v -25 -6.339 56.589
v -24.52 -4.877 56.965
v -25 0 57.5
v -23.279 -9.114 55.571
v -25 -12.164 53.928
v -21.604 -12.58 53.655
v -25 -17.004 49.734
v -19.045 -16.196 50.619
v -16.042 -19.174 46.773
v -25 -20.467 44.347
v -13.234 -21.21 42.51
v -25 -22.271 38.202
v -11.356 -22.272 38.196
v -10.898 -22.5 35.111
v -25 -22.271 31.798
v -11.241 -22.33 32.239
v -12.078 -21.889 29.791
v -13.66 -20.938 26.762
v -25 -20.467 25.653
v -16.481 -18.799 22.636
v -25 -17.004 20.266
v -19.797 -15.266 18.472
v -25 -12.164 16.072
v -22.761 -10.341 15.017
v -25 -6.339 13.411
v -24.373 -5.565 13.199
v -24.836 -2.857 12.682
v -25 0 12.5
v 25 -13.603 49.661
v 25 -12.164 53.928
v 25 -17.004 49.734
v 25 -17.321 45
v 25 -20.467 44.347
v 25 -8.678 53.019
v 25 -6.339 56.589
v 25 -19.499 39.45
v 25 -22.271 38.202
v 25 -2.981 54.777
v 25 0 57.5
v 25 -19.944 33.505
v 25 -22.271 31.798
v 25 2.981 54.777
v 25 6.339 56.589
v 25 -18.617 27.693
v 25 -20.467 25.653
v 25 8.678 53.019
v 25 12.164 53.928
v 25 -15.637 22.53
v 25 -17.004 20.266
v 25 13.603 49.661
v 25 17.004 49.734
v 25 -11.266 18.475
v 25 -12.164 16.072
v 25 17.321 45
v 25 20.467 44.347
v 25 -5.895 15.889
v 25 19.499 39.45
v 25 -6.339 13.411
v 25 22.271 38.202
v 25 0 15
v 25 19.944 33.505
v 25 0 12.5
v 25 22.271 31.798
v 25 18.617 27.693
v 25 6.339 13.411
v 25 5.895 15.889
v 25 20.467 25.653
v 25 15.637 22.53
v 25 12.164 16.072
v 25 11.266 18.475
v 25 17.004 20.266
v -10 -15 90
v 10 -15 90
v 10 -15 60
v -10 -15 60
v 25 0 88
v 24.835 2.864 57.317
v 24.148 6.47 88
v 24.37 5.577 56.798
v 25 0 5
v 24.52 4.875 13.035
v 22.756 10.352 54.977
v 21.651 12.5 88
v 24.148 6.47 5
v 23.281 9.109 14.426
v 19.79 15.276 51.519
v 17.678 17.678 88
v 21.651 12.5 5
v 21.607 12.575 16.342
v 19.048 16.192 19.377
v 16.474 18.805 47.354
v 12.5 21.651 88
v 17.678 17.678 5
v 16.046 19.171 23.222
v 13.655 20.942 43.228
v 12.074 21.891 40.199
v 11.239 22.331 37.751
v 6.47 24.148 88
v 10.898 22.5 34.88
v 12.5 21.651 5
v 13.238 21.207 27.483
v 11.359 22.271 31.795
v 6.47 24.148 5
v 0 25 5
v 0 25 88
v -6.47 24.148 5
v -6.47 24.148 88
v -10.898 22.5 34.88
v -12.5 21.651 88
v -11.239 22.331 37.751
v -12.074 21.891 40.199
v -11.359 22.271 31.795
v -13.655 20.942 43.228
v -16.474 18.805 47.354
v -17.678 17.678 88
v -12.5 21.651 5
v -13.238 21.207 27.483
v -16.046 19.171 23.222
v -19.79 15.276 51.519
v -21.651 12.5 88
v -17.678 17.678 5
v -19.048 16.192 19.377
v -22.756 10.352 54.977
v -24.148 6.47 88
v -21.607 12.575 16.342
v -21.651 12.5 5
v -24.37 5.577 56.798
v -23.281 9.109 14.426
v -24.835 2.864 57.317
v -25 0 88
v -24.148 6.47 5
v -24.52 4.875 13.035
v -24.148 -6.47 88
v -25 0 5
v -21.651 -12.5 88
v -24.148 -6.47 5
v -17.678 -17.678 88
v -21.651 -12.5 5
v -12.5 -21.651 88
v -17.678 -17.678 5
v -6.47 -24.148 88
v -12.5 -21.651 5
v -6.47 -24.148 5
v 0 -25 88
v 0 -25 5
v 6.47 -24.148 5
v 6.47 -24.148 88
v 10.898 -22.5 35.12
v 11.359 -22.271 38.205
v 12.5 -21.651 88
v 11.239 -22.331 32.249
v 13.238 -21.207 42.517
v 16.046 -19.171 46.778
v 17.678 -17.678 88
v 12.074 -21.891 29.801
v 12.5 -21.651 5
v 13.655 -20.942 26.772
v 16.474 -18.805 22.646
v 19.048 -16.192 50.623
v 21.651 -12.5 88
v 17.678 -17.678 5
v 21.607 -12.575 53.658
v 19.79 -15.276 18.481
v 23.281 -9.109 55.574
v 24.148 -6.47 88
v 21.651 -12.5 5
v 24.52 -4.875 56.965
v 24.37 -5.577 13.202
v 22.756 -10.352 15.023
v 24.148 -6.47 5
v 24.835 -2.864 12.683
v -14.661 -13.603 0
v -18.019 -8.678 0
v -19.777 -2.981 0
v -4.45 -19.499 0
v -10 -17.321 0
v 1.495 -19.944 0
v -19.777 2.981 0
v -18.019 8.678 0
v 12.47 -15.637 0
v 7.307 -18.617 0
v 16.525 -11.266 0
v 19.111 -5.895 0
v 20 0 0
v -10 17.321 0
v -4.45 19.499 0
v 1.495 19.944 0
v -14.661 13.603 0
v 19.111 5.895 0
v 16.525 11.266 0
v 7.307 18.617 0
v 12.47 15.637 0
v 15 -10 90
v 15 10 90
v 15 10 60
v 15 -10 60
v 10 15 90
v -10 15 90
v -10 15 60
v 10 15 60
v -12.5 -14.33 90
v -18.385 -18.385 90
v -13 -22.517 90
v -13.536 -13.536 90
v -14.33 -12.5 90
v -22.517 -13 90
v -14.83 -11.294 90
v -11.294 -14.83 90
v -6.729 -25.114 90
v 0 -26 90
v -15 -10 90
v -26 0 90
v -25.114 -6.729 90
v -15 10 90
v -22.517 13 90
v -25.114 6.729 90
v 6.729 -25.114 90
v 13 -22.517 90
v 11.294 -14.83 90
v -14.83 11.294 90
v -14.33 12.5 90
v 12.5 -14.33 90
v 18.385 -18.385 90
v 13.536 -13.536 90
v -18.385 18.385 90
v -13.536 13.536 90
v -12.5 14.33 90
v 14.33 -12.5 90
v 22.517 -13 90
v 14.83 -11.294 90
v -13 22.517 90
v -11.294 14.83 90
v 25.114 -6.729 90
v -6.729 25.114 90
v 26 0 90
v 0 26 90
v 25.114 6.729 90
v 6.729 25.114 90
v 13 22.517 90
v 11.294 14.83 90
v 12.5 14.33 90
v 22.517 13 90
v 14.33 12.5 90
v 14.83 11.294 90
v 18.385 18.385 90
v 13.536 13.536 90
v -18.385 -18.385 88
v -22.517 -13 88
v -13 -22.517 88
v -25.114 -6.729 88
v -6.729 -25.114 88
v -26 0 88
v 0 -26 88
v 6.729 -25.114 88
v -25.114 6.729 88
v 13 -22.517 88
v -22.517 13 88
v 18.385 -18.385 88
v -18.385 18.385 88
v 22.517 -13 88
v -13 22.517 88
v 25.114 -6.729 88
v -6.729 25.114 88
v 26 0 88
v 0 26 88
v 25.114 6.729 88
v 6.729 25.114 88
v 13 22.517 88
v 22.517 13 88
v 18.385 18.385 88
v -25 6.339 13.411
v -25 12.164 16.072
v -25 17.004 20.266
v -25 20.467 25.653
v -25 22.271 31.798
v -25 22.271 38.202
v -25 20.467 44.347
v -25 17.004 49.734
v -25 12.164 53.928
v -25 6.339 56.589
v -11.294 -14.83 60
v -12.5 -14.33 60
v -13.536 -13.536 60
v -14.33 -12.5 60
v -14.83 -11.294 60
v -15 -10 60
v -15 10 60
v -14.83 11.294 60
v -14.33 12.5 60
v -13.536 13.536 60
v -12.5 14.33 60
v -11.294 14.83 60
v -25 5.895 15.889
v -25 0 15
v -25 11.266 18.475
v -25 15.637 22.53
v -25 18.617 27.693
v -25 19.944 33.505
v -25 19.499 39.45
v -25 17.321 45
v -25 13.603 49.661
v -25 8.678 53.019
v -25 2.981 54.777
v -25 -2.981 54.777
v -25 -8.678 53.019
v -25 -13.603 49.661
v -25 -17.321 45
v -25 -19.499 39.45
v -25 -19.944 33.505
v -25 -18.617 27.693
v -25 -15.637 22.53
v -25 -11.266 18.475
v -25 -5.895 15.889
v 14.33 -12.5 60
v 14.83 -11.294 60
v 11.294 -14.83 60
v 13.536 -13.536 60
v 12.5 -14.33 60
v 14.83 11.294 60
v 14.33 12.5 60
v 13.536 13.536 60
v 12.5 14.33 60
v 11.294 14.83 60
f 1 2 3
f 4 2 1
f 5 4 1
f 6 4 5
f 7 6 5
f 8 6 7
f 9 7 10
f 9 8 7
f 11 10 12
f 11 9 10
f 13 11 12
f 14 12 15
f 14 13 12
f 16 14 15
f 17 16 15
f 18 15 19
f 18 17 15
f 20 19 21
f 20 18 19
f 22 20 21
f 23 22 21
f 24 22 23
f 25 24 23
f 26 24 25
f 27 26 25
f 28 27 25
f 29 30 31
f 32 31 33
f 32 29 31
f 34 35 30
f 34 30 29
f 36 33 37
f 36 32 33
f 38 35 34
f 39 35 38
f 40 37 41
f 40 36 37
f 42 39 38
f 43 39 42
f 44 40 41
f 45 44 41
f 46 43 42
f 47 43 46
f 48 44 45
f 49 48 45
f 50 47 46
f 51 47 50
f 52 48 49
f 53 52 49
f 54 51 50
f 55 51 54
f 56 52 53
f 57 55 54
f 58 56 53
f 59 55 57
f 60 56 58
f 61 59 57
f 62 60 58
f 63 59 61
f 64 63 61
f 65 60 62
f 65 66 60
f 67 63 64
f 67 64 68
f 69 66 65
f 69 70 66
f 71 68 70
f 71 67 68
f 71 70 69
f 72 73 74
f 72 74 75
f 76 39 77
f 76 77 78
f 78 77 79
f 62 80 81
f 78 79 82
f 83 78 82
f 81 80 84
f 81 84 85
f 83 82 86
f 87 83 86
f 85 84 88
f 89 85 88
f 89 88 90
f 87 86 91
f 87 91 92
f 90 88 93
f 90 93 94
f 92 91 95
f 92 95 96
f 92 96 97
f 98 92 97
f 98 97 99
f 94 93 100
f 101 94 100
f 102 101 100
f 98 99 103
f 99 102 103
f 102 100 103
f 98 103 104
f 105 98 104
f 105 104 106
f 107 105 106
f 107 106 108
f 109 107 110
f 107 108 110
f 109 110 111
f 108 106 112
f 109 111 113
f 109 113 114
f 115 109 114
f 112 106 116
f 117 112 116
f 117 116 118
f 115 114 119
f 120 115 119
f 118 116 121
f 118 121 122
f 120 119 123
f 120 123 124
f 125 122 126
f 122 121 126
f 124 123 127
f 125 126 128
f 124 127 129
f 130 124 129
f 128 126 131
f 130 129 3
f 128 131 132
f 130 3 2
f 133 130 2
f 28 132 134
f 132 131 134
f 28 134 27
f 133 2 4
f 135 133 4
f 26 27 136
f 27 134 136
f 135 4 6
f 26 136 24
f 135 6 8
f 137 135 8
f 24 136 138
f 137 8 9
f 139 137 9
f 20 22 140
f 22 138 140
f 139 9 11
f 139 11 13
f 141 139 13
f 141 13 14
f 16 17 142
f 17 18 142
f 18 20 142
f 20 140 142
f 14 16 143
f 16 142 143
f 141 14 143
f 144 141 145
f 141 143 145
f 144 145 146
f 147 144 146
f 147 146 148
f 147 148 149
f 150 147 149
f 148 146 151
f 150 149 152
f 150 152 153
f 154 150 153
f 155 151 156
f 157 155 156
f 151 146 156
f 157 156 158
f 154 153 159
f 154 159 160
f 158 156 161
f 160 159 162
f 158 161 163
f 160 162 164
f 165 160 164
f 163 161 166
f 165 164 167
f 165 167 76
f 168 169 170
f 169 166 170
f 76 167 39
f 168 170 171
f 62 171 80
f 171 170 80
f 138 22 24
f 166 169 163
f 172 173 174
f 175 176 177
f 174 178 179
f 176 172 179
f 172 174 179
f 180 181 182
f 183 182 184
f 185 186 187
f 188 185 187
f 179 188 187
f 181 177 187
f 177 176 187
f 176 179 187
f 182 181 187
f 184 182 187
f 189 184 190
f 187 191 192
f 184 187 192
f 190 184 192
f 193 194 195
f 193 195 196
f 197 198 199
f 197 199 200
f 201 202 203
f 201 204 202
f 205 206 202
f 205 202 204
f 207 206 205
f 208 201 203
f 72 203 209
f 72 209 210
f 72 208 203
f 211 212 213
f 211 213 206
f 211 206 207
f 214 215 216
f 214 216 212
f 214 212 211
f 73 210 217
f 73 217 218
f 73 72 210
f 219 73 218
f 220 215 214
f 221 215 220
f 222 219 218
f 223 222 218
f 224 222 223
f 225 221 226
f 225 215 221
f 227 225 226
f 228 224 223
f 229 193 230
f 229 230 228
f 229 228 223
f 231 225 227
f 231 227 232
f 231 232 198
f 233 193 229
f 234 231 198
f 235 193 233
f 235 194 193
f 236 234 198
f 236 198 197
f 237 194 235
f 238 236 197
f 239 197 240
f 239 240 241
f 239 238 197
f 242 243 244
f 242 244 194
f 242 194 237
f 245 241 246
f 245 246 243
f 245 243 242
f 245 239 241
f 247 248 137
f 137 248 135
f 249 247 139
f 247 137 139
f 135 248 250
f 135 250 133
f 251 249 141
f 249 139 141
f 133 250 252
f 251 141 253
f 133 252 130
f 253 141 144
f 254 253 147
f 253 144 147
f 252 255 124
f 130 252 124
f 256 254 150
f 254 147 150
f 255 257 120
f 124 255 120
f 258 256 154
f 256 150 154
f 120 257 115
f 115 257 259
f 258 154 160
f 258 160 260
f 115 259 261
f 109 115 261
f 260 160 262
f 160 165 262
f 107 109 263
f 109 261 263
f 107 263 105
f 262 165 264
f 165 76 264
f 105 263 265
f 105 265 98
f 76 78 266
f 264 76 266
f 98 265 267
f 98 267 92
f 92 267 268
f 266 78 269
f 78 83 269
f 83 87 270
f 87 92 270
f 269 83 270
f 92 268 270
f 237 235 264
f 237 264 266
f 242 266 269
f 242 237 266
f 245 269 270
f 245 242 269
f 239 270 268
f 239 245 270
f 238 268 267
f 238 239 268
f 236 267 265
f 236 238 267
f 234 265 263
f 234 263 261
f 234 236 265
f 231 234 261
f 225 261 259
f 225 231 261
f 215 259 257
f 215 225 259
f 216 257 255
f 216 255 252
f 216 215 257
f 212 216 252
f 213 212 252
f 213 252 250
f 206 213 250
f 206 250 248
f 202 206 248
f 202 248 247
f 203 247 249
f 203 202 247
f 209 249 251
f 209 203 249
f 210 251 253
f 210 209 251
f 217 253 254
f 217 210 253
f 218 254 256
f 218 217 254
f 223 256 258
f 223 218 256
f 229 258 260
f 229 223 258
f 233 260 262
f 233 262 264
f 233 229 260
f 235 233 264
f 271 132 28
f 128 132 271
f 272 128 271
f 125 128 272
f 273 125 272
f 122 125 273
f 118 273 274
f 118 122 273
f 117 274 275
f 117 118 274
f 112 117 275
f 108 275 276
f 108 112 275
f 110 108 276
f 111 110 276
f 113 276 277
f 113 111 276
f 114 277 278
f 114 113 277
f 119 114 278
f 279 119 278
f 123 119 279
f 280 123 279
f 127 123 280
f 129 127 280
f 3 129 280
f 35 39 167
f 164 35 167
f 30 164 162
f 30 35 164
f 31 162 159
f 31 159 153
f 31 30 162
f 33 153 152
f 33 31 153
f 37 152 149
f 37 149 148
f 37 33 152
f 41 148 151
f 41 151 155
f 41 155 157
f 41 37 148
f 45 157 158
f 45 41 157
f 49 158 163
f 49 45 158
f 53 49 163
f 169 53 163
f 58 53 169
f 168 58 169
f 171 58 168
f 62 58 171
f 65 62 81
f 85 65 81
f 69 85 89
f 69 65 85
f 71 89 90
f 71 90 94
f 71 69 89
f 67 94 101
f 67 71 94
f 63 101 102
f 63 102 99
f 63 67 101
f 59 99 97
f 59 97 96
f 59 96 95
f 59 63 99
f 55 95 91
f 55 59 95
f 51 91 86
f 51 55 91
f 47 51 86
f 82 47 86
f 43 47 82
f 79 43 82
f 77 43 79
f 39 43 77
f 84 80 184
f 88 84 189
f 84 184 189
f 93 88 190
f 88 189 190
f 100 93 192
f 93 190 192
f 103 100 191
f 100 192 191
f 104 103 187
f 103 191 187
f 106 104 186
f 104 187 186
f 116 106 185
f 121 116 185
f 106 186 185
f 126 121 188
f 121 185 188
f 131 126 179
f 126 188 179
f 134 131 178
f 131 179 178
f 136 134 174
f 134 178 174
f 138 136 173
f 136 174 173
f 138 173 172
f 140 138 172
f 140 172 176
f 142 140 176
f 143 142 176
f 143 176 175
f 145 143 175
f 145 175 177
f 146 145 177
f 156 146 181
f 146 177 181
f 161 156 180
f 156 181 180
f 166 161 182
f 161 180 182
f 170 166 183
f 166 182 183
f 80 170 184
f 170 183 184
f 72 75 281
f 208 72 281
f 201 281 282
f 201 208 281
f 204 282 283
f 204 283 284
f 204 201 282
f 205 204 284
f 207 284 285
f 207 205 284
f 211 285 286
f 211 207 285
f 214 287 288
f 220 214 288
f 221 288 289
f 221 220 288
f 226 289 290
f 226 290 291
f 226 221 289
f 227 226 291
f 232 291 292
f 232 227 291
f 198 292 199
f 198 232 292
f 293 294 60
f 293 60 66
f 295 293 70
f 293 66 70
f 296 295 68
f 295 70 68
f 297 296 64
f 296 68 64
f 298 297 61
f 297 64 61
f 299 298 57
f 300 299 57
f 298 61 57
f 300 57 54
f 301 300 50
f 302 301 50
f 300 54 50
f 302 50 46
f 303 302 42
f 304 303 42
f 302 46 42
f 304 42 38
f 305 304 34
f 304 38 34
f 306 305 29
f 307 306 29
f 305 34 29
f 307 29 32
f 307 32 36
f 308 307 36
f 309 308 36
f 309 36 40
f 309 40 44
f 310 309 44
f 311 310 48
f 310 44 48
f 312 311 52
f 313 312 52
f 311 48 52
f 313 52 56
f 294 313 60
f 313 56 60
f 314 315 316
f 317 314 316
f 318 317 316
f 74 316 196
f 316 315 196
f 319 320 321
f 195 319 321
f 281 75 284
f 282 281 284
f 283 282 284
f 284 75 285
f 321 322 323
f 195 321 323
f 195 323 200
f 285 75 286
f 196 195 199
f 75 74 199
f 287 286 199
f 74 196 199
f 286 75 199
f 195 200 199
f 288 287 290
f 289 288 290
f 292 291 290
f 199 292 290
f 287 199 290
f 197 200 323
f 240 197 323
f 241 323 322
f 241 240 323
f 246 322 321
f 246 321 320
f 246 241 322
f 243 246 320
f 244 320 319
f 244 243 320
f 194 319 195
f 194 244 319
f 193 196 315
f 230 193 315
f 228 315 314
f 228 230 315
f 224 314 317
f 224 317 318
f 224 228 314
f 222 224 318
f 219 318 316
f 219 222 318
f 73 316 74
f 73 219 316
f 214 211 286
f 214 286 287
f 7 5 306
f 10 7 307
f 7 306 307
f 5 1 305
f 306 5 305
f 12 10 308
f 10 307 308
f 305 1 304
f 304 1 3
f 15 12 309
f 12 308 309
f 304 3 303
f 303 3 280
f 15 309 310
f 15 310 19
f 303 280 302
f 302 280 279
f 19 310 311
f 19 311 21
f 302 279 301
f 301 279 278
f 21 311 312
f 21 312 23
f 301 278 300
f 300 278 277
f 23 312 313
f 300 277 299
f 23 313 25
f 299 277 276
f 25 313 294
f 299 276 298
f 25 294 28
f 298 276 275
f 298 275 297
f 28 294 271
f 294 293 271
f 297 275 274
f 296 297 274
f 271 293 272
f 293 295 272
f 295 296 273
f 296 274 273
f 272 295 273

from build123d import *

# Parameters (mm, degrees)
SKETCH1_R               = 25
BOSS_EXTRUDE3_DEPTH     = 100
SKETCH4_R               = 22.5
BOSS_EXTRUDE4_DEPTH     = 25
SKETCH5_R               = 20
CUT_EXTRUDE2_DEPTH      = 50
CHAMFER1_SIZE           = 5
SKETCH9_W               = 10
SKETCH9_H               = 60.112874217
CUT_EXTRUDE3_DEPTH      = 26.0000001
CUT_EXTRUDE3_DEPTH_BACK = 26.0000001
CUT_EXTRUDE4_DEPTH      = 30
SKETCH12_R              = 26
SKETCH12_R_2            = 25
BOSS_EXTRUDE6_DEPTH     = 2


with BuildPart() as part:
    # Sketch1 → Boss-Extrude3 (new body)
    with BuildSketch(Plane.XY):
        Circle(SKETCH1_R)
    extrude(amount=BOSS_EXTRUDE3_DEPTH)

    # Sketch4 → Boss-Extrude4 (add, symmetric)
    with BuildSketch(Plane(origin=(0, 0, 0), x_dir=(0, 0, -1), z_dir=(1, 0, 0))):
        with Locations((-35, 0)):
            Circle(SKETCH4_R)
    extrude(amount=BOSS_EXTRUDE4_DEPTH, both=True)

    # Sketch5 → Cut-Extrude2 (cut)
    with BuildSketch(Plane(origin=(25, 0, 0), x_dir=(0, 0, -1), z_dir=(1, 0, 0))):
        with Locations((-35, 0)):
            Circle(SKETCH5_R)
    extrude(amount=-CUT_EXTRUDE2_DEPTH, mode=Mode.SUBTRACT)

    # Chamfer1
    chamfer1_edges = [part.edges().sort_by_distance(p)[0] for p in [
        (-25, 0, 0),
    ]]
    chamfer(chamfer1_edges, length=CHAMFER1_SIZE)

    # Sketch9 → Cut-Extrude3 (cut, two sides)
    with BuildSketch(Plane(origin=(0, 0, 0), x_dir=(0, 0, -1), z_dir=(1, 0, 0))) as cut_extrude3_sk:
        with Locations((-95, -5.056437109)):
            Rectangle(SKETCH9_W, SKETCH9_H)
    extrude(amount=CUT_EXTRUDE3_DEPTH, mode=Mode.SUBTRACT)
    extrude(cut_extrude3_sk.sketch, amount=-CUT_EXTRUDE3_DEPTH_BACK, mode=Mode.SUBTRACT)

    # Sketch11 → Cut-Extrude4 (cut)
    with BuildSketch(Plane.XY.offset(90)):
        with BuildLine():
            Line((-10, 15), (10, 15))
            ThreePointArc((10, 15), (13.535533906, 13.535533906), (15, 10))
            Line((15, 10), (15, -10))
            ThreePointArc((15, -10), (13.535533906, -13.535533906), (10, -15))
            Line((10, -15), (-10, -15))
            ThreePointArc((-10, -15), (-13.535533906, -13.535533906), (-15, -10))
            Line((-15, -10), (-15, 10))
            ThreePointArc((-15, 10), (-13.535533906, 13.535533906), (-10, 15))
        make_face()
    extrude(amount=-CUT_EXTRUDE4_DEPTH, mode=Mode.SUBTRACT)

    # Sketch12 → Boss-Extrude6 (add)
    with BuildSketch(Plane.XY.offset(90)):
        Circle(SKETCH12_R)
        Circle(SKETCH12_R_2, mode=Mode.SUBTRACT)
    extrude(amount=-BOSS_EXTRUDE6_DEPTH)


solid = part.part
